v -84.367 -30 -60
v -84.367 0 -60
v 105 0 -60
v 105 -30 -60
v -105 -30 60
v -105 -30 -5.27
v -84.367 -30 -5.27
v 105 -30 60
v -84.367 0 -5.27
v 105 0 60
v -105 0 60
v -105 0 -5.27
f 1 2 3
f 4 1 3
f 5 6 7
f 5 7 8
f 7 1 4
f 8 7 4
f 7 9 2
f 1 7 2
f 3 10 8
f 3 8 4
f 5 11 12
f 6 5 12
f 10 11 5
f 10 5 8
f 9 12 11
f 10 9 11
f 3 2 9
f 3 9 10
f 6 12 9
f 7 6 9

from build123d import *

# Parameters (mm, degrees)
SKETCH1_W           = 210
SKETCH1_H           = 120
BOSS_EXTRUDE1_DEPTH = 30
CUT_EXTRUDE1_REACH  = 126.599
SKETCH2_W           = 20.632503002
SKETCH2_H           = 54.730004003


with BuildPart() as part:
    # Sketch1 → Boss-Extrude1 (new body)
    with BuildSketch(Plane(origin=(0, 0, 0), x_dir=(1, 0, 0), z_dir=(0, 1, 0))):
        Rectangle(SKETCH1_W, SKETCH1_H)
    extrude(amount=-BOSS_EXTRUDE1_DEPTH)

    # Sketch2 → Cut-Extrude1 (cut, up to next)
    with BuildSketch(Plane(origin=(0, 0, 0), x_dir=(1, 0, 0), z_dir=(0, 1, 0)), mode=Mode.PRIVATE) as cut_extrude1_sk1:
        with Locations((-94.683748499, 32.634997999)):
            Rectangle(SKETCH2_W, SKETCH2_H)
    cut_extrude1_tool1 = extrude(cut_extrude1_sk1.sketch, amount=-CUT_EXTRUDE1_REACH, mode=Mode.PRIVATE) & part.part
    add(cut_extrude1_tool1.solids().sort_by_distance((-94.683748, 0, -32.634998))[0], mode=Mode.SUBTRACT)


solid = part.part
